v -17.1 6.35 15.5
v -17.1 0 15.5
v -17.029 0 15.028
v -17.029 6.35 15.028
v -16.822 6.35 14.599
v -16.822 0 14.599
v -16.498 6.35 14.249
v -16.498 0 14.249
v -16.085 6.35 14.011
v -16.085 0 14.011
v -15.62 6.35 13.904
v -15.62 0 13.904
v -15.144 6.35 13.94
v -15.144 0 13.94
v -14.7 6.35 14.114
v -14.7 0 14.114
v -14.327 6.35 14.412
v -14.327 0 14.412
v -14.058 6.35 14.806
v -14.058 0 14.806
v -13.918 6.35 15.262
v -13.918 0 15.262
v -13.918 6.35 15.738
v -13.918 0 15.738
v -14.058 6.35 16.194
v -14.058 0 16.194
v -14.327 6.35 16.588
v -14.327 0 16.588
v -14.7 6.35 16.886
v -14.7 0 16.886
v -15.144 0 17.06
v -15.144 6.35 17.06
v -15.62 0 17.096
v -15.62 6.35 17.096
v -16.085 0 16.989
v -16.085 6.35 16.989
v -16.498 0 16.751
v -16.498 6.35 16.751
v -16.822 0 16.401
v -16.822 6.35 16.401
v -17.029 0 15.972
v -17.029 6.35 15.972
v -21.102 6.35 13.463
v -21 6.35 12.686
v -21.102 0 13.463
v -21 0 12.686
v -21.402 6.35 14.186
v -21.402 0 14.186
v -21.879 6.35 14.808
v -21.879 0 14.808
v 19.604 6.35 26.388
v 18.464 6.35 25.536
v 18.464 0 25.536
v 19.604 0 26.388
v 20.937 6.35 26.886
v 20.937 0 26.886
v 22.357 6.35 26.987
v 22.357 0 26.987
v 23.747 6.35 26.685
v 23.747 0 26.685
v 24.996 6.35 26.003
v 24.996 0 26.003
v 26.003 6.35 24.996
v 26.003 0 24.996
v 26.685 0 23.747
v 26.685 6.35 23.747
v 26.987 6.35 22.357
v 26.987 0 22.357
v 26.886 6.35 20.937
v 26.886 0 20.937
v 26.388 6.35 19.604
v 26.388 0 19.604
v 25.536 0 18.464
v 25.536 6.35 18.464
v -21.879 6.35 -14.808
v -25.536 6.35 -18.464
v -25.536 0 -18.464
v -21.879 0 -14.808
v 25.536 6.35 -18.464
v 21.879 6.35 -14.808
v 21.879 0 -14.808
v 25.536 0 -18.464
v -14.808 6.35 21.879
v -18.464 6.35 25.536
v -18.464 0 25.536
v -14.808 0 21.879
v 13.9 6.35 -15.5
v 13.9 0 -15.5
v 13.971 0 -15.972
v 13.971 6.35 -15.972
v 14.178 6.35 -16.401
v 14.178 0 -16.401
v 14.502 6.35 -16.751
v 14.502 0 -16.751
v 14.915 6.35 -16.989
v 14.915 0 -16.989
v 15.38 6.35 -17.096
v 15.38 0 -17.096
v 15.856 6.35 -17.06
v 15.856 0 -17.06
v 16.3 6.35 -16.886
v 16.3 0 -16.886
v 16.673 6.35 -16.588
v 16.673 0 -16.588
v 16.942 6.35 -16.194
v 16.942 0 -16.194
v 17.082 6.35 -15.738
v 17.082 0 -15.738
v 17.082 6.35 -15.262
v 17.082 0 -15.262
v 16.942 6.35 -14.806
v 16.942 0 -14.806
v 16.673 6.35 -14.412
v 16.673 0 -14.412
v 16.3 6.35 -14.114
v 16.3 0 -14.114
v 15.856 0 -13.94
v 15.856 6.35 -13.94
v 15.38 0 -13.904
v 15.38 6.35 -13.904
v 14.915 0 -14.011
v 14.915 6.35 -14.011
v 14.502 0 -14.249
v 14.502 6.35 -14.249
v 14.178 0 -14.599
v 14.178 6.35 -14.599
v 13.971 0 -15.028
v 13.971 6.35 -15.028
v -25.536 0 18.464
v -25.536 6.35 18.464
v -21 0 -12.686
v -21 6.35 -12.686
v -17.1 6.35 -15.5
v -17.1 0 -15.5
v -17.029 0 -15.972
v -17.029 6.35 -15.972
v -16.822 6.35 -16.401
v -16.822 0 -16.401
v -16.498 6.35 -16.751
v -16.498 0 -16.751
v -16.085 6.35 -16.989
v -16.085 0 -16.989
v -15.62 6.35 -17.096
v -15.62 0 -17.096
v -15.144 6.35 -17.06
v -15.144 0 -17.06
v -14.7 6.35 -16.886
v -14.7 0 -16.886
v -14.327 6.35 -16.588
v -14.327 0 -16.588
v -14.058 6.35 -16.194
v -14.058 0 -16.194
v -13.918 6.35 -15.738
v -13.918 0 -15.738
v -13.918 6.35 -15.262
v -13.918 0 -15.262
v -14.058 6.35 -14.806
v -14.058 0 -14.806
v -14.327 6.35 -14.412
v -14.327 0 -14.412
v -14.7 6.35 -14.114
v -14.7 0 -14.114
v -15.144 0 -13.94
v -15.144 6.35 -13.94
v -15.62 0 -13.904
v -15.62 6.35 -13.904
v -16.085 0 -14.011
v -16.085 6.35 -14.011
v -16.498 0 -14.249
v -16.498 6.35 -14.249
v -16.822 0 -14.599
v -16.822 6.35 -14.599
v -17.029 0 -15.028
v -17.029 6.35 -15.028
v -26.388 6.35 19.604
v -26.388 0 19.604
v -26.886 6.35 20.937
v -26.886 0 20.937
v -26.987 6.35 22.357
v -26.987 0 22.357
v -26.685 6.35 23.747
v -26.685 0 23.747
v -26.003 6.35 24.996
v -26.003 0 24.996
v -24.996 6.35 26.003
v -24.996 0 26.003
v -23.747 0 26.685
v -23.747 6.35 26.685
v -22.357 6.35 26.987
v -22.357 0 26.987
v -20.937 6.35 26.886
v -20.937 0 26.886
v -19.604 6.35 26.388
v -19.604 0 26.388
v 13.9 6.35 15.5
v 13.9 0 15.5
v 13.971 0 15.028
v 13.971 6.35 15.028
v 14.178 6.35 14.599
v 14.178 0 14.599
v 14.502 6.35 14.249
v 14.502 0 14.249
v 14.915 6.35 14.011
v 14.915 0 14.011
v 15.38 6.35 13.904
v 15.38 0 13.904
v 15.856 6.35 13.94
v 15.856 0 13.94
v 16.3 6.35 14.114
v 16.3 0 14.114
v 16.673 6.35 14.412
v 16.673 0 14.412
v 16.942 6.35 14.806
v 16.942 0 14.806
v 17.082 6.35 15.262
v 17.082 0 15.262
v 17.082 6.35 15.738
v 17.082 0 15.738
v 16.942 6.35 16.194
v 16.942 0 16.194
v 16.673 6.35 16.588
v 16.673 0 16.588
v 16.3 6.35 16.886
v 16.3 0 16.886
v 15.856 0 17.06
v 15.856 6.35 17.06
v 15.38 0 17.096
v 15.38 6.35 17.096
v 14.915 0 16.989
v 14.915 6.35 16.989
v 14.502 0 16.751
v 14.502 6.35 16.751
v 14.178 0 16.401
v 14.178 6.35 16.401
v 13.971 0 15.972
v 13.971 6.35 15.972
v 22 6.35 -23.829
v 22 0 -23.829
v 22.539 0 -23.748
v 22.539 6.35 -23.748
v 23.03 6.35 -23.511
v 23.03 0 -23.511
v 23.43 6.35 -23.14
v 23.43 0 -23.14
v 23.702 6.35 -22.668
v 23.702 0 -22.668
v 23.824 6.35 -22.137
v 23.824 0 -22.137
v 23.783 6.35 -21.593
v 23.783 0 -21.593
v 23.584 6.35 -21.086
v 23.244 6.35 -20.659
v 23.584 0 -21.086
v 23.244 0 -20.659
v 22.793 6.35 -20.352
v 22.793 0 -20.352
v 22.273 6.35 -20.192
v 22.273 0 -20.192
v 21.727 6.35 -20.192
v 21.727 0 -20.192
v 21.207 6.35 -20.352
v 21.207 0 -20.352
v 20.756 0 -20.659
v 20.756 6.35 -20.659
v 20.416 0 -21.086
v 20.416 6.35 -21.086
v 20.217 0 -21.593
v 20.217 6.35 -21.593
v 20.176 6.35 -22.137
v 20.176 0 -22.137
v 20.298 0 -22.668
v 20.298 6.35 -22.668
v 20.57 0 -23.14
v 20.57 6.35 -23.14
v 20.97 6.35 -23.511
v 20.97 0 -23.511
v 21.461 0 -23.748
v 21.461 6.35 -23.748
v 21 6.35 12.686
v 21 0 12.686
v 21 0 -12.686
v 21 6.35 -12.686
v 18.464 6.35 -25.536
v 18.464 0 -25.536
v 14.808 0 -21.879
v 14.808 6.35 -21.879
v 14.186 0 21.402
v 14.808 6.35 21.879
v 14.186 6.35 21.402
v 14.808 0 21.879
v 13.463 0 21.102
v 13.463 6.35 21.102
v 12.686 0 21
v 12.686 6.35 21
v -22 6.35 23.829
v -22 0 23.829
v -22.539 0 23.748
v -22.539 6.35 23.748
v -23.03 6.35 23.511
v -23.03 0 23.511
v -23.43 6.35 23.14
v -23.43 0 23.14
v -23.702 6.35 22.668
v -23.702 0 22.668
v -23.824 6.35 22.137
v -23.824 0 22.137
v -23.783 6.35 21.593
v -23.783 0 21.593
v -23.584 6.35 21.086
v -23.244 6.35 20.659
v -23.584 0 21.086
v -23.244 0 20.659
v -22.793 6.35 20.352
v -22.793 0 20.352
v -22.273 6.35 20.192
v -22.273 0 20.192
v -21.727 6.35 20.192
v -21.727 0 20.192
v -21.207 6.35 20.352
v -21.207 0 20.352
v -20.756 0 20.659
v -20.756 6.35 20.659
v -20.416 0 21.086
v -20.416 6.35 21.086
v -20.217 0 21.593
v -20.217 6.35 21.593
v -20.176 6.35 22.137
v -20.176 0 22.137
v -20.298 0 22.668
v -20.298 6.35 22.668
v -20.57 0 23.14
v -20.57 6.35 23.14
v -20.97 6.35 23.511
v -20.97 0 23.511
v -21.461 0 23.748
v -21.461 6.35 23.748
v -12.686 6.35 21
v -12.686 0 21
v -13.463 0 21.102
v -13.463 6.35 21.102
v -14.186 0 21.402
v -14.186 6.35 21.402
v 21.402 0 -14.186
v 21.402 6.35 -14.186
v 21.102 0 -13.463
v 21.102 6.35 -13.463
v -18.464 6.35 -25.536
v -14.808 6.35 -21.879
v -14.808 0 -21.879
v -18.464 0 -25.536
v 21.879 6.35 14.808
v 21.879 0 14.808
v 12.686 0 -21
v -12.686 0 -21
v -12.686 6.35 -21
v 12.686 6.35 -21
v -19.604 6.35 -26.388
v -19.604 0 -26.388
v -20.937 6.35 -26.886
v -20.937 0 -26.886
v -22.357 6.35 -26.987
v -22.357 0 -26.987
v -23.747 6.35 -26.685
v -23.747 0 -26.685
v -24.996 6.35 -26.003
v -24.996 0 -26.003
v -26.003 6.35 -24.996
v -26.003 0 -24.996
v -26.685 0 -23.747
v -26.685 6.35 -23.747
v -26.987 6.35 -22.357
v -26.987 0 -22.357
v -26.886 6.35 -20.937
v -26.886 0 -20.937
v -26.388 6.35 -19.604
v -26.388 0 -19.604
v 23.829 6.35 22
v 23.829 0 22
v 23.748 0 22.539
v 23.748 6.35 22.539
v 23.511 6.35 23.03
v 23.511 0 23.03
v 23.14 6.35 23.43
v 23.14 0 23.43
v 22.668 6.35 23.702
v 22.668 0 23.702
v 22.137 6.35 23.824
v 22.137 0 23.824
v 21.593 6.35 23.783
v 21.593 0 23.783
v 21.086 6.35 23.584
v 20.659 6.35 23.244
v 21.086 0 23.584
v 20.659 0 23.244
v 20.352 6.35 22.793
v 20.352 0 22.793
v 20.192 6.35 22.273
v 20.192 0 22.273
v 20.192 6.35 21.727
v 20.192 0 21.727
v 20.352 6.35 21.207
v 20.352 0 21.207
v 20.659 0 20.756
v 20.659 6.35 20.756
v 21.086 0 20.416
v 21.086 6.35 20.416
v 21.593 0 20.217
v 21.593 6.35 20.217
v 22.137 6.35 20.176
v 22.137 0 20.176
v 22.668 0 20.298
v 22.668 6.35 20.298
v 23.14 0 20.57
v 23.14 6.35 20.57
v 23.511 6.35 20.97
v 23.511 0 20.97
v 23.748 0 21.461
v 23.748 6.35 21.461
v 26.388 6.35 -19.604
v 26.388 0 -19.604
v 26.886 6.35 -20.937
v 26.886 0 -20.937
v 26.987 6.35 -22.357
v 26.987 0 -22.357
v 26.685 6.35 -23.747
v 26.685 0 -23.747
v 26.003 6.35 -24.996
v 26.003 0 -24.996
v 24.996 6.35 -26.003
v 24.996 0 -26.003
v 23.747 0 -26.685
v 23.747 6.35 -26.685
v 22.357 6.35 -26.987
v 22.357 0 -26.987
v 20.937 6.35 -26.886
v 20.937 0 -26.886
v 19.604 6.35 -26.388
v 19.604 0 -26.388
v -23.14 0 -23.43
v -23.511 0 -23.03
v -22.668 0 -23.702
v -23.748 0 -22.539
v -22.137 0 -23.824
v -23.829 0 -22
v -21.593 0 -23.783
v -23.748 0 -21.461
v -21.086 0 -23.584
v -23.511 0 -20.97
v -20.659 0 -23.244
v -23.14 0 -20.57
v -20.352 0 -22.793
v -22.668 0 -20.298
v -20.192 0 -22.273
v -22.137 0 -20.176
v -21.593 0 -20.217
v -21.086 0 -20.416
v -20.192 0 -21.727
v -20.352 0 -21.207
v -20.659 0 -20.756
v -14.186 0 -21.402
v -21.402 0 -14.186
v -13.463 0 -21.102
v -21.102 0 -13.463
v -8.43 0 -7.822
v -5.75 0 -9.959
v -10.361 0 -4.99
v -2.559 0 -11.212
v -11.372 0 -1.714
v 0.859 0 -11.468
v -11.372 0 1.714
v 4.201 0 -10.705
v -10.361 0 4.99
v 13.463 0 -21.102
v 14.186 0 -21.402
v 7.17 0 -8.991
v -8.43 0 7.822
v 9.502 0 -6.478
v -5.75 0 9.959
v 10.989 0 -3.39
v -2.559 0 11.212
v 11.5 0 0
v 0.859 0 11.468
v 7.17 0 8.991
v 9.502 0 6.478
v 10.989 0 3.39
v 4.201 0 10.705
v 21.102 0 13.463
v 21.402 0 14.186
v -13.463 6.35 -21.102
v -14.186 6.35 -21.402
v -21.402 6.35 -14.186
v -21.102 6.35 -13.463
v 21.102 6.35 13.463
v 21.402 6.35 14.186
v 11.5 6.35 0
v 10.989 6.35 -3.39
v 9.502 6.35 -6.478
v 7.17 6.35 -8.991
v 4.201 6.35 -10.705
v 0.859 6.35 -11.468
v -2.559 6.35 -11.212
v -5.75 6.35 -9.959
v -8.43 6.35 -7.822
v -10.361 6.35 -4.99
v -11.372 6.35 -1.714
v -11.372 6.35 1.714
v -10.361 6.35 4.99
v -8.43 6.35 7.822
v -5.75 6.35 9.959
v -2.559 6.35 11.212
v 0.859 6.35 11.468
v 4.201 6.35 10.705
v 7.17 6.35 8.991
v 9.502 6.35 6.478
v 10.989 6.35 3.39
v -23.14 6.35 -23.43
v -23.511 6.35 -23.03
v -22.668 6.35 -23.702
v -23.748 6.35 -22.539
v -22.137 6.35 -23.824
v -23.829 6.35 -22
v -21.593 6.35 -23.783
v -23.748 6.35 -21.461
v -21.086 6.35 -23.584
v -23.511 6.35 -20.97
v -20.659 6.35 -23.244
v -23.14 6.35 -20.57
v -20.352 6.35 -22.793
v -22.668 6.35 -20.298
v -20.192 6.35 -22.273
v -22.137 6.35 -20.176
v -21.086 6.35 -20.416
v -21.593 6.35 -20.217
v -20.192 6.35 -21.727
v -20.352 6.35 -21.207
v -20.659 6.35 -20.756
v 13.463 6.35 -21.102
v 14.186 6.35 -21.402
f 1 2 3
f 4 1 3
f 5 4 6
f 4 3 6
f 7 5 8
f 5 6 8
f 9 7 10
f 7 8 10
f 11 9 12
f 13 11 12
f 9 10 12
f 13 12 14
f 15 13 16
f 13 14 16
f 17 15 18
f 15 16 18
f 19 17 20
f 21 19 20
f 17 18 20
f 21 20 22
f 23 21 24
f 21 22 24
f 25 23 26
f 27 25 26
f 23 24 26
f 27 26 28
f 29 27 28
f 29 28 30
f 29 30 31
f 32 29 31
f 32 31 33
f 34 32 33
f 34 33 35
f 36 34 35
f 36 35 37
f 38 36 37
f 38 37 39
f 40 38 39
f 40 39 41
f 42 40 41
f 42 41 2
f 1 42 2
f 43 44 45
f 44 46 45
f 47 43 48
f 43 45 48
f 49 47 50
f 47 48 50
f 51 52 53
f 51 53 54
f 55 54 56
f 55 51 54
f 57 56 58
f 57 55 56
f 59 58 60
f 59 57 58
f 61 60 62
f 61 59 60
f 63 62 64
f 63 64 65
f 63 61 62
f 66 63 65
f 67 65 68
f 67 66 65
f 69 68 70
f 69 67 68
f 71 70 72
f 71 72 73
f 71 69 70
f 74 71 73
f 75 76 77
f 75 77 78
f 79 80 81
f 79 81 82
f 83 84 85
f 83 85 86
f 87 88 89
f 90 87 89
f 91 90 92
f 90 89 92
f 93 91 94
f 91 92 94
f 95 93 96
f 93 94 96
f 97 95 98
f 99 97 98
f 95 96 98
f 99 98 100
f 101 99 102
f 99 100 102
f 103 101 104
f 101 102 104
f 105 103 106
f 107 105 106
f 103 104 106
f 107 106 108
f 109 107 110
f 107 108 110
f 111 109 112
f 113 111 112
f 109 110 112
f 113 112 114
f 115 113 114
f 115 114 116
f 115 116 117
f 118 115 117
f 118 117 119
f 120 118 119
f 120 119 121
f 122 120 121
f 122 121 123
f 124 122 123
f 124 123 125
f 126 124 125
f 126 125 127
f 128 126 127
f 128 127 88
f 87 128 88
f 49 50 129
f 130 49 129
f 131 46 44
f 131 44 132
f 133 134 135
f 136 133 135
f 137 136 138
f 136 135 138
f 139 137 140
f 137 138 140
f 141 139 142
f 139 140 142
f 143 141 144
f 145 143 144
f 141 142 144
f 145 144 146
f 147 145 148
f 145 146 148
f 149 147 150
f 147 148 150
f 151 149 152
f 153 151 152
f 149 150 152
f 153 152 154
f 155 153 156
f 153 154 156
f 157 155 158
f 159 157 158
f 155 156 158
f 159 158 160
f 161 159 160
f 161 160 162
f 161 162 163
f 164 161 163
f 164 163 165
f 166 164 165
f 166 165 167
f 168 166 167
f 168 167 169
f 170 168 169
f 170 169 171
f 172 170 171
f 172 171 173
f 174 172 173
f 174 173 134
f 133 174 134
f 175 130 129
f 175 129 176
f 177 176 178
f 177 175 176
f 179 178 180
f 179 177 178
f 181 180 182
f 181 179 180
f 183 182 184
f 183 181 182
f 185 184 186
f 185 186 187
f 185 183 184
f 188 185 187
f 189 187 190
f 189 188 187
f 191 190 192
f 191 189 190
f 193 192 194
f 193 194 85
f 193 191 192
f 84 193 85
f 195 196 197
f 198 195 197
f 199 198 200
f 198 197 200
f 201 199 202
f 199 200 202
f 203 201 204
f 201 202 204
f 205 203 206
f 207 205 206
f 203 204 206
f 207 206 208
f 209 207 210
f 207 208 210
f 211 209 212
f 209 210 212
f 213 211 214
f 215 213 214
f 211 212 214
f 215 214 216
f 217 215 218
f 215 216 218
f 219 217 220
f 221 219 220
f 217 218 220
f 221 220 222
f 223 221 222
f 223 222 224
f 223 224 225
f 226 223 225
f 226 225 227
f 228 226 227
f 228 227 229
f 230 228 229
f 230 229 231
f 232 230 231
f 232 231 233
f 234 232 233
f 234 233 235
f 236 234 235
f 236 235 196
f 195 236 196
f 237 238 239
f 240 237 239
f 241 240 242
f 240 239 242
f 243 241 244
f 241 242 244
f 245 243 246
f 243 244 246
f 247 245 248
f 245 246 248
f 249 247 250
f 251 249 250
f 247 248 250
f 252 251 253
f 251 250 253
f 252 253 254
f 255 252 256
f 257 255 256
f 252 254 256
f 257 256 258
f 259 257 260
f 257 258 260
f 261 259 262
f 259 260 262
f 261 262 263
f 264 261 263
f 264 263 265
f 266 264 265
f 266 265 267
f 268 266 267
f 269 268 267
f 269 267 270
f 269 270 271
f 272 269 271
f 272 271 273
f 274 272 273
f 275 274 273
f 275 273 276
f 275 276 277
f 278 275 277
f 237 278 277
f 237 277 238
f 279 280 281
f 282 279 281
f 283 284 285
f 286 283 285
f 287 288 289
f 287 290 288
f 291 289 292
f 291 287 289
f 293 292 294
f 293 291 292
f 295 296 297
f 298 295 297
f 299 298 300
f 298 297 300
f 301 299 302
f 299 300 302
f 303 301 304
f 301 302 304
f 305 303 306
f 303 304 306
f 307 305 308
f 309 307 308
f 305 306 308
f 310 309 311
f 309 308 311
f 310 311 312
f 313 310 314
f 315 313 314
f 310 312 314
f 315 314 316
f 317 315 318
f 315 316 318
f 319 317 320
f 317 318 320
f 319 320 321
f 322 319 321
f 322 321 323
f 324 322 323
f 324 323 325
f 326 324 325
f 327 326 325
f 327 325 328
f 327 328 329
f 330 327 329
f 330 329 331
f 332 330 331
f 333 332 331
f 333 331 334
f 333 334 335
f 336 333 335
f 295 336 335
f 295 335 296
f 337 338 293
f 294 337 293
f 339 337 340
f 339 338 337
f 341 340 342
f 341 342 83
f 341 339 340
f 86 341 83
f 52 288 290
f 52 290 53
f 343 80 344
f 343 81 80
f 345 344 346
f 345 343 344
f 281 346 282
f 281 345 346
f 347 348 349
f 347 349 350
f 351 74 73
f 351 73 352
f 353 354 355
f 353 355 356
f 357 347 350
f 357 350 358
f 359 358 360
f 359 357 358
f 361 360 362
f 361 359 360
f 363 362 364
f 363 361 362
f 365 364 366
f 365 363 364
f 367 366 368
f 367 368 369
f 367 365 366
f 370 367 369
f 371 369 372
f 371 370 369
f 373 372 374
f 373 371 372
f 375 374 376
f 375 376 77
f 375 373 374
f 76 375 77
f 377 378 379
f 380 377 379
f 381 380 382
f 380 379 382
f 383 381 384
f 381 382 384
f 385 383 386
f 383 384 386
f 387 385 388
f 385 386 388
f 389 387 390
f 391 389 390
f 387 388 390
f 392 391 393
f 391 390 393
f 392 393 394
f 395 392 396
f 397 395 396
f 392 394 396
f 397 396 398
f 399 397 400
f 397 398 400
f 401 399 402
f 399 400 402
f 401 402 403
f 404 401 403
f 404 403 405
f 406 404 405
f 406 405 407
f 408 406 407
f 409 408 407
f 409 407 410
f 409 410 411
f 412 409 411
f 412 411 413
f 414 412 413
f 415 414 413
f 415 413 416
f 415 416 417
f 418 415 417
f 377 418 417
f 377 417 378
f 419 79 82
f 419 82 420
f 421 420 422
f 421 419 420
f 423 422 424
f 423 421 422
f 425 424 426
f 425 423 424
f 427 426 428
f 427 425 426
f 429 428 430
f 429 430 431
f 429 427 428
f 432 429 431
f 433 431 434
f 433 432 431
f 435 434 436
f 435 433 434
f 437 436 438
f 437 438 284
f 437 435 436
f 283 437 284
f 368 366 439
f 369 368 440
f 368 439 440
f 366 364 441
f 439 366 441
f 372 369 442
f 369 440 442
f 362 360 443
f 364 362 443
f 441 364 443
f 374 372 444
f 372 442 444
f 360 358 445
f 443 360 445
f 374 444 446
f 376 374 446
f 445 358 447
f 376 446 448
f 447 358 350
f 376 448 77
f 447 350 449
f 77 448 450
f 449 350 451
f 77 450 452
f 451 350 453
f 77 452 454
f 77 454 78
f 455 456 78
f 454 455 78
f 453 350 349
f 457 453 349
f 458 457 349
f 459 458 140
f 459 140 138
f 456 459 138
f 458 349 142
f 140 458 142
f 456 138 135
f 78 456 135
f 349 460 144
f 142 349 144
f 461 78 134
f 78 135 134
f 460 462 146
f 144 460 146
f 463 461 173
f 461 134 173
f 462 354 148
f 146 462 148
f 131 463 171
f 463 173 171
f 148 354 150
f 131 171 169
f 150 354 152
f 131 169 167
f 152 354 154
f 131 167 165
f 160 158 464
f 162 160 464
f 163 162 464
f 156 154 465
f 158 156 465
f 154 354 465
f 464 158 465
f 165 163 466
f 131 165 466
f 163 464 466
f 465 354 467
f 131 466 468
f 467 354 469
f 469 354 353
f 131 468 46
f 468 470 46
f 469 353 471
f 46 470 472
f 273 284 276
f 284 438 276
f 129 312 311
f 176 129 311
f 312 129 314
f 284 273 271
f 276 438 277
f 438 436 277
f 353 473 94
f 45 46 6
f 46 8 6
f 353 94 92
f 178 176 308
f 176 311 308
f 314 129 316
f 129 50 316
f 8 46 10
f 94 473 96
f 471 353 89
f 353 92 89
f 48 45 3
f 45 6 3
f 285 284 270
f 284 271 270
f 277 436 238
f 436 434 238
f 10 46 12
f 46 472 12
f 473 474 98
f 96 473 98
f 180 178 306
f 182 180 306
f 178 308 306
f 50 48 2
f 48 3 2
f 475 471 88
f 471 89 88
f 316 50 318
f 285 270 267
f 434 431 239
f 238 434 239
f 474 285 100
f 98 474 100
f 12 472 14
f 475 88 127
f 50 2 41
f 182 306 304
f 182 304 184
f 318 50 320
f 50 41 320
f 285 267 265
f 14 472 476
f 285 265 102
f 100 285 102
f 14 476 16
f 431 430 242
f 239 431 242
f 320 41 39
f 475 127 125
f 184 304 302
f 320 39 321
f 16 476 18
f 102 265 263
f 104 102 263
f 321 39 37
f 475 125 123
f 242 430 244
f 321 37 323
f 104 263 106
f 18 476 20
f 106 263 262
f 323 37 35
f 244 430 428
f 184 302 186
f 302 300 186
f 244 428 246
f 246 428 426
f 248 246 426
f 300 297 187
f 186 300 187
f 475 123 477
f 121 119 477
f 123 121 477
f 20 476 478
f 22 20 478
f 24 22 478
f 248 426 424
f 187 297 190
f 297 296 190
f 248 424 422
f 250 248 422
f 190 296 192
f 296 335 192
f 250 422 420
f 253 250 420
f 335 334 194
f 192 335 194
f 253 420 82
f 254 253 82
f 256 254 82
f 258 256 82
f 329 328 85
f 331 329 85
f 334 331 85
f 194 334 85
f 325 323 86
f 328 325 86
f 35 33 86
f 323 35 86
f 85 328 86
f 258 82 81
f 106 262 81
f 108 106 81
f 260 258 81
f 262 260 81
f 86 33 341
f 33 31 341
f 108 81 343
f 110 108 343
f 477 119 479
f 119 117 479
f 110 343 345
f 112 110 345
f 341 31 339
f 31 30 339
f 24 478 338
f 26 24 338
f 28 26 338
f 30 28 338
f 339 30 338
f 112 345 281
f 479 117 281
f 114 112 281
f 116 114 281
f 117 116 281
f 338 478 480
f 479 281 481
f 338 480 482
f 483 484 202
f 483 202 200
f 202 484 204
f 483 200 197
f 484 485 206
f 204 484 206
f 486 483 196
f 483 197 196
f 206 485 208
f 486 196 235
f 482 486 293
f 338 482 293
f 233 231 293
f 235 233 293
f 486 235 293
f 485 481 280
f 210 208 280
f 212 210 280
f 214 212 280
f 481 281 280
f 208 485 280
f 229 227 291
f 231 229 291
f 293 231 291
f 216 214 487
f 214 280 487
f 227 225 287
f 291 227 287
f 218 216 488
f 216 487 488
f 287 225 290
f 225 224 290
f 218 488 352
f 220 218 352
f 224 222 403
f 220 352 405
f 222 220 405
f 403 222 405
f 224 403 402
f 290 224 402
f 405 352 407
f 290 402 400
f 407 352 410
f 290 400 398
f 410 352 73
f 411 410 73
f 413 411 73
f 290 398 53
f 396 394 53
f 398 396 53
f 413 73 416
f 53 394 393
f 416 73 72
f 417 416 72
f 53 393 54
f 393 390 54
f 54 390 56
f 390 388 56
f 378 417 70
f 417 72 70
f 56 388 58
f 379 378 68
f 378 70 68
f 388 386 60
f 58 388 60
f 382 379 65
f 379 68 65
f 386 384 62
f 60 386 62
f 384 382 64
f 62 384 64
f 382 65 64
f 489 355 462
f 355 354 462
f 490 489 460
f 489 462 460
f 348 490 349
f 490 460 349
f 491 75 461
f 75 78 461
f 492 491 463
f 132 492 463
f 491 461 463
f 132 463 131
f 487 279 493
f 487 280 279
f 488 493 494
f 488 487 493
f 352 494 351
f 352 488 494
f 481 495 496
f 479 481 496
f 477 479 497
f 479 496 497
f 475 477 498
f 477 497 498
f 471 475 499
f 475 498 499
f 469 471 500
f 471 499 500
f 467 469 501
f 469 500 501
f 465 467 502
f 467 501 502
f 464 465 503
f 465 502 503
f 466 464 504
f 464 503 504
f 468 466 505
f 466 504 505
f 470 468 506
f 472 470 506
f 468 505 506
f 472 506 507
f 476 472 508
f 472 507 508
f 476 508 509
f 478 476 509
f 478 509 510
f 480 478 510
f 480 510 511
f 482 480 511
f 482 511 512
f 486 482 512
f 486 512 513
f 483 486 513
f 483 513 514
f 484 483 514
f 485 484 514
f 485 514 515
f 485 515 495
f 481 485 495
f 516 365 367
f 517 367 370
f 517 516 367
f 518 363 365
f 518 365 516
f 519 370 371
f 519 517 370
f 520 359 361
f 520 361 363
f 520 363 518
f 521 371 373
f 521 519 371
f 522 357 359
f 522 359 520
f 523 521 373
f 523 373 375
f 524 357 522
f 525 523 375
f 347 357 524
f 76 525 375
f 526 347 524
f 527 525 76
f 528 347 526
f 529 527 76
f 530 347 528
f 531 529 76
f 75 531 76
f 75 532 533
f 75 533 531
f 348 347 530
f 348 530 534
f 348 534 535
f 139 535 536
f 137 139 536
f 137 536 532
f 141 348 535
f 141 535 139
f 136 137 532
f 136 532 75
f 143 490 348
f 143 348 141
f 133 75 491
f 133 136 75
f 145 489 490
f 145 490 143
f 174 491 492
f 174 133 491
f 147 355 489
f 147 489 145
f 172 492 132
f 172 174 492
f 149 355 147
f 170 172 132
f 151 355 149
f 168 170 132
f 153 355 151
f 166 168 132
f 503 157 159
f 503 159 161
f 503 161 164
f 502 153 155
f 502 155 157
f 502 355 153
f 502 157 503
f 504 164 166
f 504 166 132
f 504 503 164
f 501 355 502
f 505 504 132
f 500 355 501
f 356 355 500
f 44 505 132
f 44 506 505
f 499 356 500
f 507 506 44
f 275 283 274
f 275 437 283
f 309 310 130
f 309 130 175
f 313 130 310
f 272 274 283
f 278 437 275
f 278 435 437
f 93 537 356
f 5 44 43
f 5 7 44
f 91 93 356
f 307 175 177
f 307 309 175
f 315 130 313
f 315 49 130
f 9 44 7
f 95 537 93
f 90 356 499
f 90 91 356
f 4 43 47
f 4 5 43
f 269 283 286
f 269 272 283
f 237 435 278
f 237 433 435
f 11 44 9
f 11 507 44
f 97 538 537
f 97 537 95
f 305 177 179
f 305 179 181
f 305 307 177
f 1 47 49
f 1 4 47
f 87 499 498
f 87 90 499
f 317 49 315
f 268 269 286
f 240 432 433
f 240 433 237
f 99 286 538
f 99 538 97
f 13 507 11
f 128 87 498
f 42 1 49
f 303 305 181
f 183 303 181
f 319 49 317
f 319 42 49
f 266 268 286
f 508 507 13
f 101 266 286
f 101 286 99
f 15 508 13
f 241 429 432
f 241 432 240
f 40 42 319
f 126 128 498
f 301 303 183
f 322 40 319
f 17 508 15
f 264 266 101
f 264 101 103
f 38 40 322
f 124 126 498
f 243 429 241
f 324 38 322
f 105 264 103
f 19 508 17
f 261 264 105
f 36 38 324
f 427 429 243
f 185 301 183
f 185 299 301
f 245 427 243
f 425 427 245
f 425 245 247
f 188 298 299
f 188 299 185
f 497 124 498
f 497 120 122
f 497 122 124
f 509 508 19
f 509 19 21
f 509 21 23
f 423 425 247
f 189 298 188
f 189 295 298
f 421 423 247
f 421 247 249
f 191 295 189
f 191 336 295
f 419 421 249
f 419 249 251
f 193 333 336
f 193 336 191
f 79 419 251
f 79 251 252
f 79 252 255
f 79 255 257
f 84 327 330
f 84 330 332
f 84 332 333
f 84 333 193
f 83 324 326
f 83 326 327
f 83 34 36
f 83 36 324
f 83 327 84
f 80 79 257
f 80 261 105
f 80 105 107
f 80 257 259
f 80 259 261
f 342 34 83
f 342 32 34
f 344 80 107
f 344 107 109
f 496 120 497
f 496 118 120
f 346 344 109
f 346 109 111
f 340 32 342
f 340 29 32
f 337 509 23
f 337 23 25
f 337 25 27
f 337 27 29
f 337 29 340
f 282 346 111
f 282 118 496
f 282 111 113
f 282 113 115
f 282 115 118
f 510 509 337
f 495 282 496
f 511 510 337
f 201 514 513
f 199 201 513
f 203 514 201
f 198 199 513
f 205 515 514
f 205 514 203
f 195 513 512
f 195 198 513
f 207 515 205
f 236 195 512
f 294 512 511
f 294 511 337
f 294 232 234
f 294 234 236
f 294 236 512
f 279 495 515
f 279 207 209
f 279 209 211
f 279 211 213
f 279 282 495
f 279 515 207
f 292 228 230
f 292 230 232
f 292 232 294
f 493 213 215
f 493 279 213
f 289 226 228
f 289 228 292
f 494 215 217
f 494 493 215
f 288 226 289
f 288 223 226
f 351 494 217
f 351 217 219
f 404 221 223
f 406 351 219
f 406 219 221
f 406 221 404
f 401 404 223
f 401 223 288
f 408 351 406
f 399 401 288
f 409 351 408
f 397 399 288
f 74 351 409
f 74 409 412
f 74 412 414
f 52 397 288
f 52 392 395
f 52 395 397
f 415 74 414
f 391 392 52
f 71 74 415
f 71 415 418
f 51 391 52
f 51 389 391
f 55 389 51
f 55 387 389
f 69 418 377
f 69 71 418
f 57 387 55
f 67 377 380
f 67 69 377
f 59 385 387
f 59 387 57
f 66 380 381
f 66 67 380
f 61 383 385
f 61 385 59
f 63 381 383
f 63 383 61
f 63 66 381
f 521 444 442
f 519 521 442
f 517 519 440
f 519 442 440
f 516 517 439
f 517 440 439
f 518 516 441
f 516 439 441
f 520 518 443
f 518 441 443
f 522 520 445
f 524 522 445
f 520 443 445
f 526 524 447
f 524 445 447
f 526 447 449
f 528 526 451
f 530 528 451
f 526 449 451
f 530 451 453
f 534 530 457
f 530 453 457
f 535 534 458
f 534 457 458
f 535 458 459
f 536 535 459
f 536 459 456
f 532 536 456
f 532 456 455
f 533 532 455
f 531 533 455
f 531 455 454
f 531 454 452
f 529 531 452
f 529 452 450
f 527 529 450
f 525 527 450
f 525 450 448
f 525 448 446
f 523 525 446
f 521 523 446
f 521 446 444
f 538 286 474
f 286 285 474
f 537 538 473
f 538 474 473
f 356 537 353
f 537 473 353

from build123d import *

# Parameters (mm, degrees)
SKETCH1_W             = 42
SKETCH1_H             = 42
BOSS_EXTRUDE1_DEPTH   = 6.35
M3_CLEARANCE_HOLE1_D  = 3.2
SKETCH6_R             = 11.5
CUT_EXTRUDE1_DEPTH    = 31.369762923
BOSS_EXTRUDE2_DEPTH   = 6.35
F_6_CLEARANCE_HOLE1_D = 3.6576
CIRPATTERN2_COUNT     = 4
FILLET2_R             = 3


with BuildPart() as part:
    # Sketch1 → Boss-Extrude1 (new body)
    with BuildSketch(Plane(origin=(0, 0, 0), x_dir=(1, 0, 0), z_dir=(0, 1, 0))):
        Rectangle(SKETCH1_W, SKETCH1_H)
    extrude(amount=BOSS_EXTRUDE1_DEPTH)

    # M3 Clearance Hole1 (through all)
    with Locations(Plane(origin=(0, 6.35, 0), x_dir=(1, 0, 0), z_dir=(0, 1, 0))):
        with Locations((-15.5, 15.5), (-15.5, -15.5), (15.5, -15.5), (15.5, 15.5)):
            Hole(M3_CLEARANCE_HOLE1_D / 2)

    # Sketch6 → Cut-Extrude1 (cut, through all)
    with BuildSketch(Plane(origin=(0, 6.35, 0), x_dir=(1, 0, 0), z_dir=(0, 1, 0))):
        Circle(SKETCH6_R)
    extrude(amount=-CUT_EXTRUDE1_DEPTH, mode=Mode.SUBTRACT)

    # Sketch7 → Boss-Extrude2 (add)
    with BuildSketch(Plane(origin=(0, 6.35, 0), x_dir=(1, 0, 0), z_dir=(0, 1, 0))):
        with BuildLine():
            Line((-25.535533906, 18.464466094), (-21, 13.928932188))
            Line((-21, 13.928932188), (-21, 21))
            Line((-21, 21), (-13.928932188, 21))
            Line((-13.928932188, 21), (-18.464466094, 25.535533906))
            ThreePointArc((-18.464466094, 25.535533906), (-25.535533906, 25.535533906), (-25.535533906, 18.464466094))
        make_face()
    boss_extrude2 = extrude(amount=-BOSS_EXTRUDE2_DEPTH)

    # #6 Clearance Hole1 (through all)
    with Locations(Plane(origin=(0, 6.35, 0), x_dir=(1, 0, 0), z_dir=(0, 1, 0))):
        with Locations((-22, 22)):
            f_6_clearance_hole1 = Hole(F_6_CLEARANCE_HOLE1_D / 2)

    # CirPattern2: Boss-Extrude2, #6 Clearance Hole1 ×4 about axis
    cirpattern2_axis = Axis((0, 0, 0), (0, 1, 0))
    add([boss_extrude2.rotate(cirpattern2_axis, i * 360 / CIRPATTERN2_COUNT) for i in range(1, CIRPATTERN2_COUNT)])
    add([f_6_clearance_hole1.rotate(cirpattern2_axis, i * 360 / CIRPATTERN2_COUNT) for i in range(1, CIRPATTERN2_COUNT)], mode=Mode.SUBTRACT)

    # Fillet2
    fillet2_edges = [part.edges().sort_by_distance(p)[0] for p in [
        (13.928932188, 3.175, -21),
        (21, 3.175, -13.928932188),
        (21, 3.175, 13.928932188),
        (13.928932188, 3.175, 21),
        (-13.928932188, 3.175, 21),
        (-21, 3.175, 13.928932188),
        (-21, 3.175, -13.928932188),
        (-13.928932188, 3.175, -21),
    ]]
    fillet(fillet2_edges, radius=FILLET2_R)


solid = part.part
